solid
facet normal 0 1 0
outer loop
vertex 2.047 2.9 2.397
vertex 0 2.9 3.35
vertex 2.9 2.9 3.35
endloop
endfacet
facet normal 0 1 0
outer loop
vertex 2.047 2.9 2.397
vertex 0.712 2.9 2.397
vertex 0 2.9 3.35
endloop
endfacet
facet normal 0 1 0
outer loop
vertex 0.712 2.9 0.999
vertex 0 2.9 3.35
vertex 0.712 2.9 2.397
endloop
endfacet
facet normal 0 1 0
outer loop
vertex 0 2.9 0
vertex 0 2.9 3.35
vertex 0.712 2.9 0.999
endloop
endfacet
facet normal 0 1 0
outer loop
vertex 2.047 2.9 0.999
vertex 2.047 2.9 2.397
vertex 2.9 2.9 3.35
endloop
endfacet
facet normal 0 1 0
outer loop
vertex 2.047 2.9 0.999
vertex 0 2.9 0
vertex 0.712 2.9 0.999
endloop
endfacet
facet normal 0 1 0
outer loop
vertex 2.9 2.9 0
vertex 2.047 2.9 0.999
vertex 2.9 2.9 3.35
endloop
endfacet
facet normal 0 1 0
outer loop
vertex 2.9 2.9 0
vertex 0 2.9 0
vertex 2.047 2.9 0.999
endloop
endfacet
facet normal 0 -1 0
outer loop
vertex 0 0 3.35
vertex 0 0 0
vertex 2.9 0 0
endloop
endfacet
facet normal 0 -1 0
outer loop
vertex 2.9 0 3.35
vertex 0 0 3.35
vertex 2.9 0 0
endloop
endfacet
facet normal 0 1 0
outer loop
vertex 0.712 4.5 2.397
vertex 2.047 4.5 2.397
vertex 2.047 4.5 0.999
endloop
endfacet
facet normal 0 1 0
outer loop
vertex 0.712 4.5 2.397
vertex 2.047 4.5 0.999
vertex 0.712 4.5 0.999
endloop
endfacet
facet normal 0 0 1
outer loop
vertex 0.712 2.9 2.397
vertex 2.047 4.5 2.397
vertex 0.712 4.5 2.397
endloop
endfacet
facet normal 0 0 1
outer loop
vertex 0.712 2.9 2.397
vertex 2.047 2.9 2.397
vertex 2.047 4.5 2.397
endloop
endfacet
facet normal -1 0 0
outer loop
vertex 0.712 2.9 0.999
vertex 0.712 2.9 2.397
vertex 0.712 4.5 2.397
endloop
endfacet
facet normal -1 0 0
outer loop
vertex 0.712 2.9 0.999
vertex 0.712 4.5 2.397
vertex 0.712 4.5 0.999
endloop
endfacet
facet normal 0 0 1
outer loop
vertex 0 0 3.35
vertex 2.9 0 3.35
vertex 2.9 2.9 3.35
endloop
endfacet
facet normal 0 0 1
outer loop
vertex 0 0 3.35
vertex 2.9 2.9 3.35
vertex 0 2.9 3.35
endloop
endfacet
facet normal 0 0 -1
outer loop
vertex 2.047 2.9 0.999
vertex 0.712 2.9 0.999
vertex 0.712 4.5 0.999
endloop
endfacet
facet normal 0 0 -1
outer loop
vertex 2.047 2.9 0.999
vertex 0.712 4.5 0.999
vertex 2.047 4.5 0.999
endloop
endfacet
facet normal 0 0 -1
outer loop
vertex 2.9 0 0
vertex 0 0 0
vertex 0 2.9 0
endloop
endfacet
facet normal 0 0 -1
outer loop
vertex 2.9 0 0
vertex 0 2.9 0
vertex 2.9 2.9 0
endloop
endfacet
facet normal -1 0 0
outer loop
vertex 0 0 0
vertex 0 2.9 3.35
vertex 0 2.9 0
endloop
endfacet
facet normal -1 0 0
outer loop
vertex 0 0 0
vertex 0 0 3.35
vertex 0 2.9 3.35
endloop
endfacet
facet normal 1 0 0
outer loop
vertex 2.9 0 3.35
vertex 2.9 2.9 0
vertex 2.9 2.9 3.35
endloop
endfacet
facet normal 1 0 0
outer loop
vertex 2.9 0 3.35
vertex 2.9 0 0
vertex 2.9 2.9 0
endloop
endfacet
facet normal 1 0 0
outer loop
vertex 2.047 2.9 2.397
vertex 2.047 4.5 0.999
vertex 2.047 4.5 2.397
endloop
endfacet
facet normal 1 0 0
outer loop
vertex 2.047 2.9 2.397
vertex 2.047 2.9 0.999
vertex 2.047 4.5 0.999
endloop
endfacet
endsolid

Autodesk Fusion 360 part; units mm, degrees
sketch "Sketch1" plane through (0, 0, 0) normal (0, 1, 0) x (1, 0, 0)
  line L0 (0, 0) -> (2.9, 0)
  line L1 (2.9, 0) -> (2.9, -3.35)
  line L2 (2.9, -3.35) -> (0, -3.35)
  line L3 (0, -3.35) -> (0, 0)
  dimension "d1" = 3.35
  dimension "d2" = 2.9
extrude "Extrude1" add sketch "Sketch1" along normal blind 2.9
sketch "Sketch2" plane through (0, 2.9, 0) normal (0, 1, 0) x (-1, 0, 0)
  line L0 (0, 3.35) -> (-2.9, 3.35)
  line L1 (-2.9, 3.35) -> (-2.9, 0)
  line L2 (-2.9, 0) -> (0, 0)
  line L3 (0, 0) -> (0, 3.35)
  line L4 (-0.712, 0.999) -> (-2.047, 0.999)
  line L5 (-2.047, 0.999) -> (-2.047, 2.397)
  line L6 (-2.047, 2.397) -> (-0.712, 2.397)
  line L7 (-0.712, 2.397) -> (-0.712, 0.999)
  dimension "d5" = 1.398
  dimension "d6" = 1.335
  dimension "d7" = 0.953
  dimension "d8" = 0.712
extrude "Extrude2" add sketch "Sketch2" along normal blind 1.6 contours L4 L5 L6 L7
